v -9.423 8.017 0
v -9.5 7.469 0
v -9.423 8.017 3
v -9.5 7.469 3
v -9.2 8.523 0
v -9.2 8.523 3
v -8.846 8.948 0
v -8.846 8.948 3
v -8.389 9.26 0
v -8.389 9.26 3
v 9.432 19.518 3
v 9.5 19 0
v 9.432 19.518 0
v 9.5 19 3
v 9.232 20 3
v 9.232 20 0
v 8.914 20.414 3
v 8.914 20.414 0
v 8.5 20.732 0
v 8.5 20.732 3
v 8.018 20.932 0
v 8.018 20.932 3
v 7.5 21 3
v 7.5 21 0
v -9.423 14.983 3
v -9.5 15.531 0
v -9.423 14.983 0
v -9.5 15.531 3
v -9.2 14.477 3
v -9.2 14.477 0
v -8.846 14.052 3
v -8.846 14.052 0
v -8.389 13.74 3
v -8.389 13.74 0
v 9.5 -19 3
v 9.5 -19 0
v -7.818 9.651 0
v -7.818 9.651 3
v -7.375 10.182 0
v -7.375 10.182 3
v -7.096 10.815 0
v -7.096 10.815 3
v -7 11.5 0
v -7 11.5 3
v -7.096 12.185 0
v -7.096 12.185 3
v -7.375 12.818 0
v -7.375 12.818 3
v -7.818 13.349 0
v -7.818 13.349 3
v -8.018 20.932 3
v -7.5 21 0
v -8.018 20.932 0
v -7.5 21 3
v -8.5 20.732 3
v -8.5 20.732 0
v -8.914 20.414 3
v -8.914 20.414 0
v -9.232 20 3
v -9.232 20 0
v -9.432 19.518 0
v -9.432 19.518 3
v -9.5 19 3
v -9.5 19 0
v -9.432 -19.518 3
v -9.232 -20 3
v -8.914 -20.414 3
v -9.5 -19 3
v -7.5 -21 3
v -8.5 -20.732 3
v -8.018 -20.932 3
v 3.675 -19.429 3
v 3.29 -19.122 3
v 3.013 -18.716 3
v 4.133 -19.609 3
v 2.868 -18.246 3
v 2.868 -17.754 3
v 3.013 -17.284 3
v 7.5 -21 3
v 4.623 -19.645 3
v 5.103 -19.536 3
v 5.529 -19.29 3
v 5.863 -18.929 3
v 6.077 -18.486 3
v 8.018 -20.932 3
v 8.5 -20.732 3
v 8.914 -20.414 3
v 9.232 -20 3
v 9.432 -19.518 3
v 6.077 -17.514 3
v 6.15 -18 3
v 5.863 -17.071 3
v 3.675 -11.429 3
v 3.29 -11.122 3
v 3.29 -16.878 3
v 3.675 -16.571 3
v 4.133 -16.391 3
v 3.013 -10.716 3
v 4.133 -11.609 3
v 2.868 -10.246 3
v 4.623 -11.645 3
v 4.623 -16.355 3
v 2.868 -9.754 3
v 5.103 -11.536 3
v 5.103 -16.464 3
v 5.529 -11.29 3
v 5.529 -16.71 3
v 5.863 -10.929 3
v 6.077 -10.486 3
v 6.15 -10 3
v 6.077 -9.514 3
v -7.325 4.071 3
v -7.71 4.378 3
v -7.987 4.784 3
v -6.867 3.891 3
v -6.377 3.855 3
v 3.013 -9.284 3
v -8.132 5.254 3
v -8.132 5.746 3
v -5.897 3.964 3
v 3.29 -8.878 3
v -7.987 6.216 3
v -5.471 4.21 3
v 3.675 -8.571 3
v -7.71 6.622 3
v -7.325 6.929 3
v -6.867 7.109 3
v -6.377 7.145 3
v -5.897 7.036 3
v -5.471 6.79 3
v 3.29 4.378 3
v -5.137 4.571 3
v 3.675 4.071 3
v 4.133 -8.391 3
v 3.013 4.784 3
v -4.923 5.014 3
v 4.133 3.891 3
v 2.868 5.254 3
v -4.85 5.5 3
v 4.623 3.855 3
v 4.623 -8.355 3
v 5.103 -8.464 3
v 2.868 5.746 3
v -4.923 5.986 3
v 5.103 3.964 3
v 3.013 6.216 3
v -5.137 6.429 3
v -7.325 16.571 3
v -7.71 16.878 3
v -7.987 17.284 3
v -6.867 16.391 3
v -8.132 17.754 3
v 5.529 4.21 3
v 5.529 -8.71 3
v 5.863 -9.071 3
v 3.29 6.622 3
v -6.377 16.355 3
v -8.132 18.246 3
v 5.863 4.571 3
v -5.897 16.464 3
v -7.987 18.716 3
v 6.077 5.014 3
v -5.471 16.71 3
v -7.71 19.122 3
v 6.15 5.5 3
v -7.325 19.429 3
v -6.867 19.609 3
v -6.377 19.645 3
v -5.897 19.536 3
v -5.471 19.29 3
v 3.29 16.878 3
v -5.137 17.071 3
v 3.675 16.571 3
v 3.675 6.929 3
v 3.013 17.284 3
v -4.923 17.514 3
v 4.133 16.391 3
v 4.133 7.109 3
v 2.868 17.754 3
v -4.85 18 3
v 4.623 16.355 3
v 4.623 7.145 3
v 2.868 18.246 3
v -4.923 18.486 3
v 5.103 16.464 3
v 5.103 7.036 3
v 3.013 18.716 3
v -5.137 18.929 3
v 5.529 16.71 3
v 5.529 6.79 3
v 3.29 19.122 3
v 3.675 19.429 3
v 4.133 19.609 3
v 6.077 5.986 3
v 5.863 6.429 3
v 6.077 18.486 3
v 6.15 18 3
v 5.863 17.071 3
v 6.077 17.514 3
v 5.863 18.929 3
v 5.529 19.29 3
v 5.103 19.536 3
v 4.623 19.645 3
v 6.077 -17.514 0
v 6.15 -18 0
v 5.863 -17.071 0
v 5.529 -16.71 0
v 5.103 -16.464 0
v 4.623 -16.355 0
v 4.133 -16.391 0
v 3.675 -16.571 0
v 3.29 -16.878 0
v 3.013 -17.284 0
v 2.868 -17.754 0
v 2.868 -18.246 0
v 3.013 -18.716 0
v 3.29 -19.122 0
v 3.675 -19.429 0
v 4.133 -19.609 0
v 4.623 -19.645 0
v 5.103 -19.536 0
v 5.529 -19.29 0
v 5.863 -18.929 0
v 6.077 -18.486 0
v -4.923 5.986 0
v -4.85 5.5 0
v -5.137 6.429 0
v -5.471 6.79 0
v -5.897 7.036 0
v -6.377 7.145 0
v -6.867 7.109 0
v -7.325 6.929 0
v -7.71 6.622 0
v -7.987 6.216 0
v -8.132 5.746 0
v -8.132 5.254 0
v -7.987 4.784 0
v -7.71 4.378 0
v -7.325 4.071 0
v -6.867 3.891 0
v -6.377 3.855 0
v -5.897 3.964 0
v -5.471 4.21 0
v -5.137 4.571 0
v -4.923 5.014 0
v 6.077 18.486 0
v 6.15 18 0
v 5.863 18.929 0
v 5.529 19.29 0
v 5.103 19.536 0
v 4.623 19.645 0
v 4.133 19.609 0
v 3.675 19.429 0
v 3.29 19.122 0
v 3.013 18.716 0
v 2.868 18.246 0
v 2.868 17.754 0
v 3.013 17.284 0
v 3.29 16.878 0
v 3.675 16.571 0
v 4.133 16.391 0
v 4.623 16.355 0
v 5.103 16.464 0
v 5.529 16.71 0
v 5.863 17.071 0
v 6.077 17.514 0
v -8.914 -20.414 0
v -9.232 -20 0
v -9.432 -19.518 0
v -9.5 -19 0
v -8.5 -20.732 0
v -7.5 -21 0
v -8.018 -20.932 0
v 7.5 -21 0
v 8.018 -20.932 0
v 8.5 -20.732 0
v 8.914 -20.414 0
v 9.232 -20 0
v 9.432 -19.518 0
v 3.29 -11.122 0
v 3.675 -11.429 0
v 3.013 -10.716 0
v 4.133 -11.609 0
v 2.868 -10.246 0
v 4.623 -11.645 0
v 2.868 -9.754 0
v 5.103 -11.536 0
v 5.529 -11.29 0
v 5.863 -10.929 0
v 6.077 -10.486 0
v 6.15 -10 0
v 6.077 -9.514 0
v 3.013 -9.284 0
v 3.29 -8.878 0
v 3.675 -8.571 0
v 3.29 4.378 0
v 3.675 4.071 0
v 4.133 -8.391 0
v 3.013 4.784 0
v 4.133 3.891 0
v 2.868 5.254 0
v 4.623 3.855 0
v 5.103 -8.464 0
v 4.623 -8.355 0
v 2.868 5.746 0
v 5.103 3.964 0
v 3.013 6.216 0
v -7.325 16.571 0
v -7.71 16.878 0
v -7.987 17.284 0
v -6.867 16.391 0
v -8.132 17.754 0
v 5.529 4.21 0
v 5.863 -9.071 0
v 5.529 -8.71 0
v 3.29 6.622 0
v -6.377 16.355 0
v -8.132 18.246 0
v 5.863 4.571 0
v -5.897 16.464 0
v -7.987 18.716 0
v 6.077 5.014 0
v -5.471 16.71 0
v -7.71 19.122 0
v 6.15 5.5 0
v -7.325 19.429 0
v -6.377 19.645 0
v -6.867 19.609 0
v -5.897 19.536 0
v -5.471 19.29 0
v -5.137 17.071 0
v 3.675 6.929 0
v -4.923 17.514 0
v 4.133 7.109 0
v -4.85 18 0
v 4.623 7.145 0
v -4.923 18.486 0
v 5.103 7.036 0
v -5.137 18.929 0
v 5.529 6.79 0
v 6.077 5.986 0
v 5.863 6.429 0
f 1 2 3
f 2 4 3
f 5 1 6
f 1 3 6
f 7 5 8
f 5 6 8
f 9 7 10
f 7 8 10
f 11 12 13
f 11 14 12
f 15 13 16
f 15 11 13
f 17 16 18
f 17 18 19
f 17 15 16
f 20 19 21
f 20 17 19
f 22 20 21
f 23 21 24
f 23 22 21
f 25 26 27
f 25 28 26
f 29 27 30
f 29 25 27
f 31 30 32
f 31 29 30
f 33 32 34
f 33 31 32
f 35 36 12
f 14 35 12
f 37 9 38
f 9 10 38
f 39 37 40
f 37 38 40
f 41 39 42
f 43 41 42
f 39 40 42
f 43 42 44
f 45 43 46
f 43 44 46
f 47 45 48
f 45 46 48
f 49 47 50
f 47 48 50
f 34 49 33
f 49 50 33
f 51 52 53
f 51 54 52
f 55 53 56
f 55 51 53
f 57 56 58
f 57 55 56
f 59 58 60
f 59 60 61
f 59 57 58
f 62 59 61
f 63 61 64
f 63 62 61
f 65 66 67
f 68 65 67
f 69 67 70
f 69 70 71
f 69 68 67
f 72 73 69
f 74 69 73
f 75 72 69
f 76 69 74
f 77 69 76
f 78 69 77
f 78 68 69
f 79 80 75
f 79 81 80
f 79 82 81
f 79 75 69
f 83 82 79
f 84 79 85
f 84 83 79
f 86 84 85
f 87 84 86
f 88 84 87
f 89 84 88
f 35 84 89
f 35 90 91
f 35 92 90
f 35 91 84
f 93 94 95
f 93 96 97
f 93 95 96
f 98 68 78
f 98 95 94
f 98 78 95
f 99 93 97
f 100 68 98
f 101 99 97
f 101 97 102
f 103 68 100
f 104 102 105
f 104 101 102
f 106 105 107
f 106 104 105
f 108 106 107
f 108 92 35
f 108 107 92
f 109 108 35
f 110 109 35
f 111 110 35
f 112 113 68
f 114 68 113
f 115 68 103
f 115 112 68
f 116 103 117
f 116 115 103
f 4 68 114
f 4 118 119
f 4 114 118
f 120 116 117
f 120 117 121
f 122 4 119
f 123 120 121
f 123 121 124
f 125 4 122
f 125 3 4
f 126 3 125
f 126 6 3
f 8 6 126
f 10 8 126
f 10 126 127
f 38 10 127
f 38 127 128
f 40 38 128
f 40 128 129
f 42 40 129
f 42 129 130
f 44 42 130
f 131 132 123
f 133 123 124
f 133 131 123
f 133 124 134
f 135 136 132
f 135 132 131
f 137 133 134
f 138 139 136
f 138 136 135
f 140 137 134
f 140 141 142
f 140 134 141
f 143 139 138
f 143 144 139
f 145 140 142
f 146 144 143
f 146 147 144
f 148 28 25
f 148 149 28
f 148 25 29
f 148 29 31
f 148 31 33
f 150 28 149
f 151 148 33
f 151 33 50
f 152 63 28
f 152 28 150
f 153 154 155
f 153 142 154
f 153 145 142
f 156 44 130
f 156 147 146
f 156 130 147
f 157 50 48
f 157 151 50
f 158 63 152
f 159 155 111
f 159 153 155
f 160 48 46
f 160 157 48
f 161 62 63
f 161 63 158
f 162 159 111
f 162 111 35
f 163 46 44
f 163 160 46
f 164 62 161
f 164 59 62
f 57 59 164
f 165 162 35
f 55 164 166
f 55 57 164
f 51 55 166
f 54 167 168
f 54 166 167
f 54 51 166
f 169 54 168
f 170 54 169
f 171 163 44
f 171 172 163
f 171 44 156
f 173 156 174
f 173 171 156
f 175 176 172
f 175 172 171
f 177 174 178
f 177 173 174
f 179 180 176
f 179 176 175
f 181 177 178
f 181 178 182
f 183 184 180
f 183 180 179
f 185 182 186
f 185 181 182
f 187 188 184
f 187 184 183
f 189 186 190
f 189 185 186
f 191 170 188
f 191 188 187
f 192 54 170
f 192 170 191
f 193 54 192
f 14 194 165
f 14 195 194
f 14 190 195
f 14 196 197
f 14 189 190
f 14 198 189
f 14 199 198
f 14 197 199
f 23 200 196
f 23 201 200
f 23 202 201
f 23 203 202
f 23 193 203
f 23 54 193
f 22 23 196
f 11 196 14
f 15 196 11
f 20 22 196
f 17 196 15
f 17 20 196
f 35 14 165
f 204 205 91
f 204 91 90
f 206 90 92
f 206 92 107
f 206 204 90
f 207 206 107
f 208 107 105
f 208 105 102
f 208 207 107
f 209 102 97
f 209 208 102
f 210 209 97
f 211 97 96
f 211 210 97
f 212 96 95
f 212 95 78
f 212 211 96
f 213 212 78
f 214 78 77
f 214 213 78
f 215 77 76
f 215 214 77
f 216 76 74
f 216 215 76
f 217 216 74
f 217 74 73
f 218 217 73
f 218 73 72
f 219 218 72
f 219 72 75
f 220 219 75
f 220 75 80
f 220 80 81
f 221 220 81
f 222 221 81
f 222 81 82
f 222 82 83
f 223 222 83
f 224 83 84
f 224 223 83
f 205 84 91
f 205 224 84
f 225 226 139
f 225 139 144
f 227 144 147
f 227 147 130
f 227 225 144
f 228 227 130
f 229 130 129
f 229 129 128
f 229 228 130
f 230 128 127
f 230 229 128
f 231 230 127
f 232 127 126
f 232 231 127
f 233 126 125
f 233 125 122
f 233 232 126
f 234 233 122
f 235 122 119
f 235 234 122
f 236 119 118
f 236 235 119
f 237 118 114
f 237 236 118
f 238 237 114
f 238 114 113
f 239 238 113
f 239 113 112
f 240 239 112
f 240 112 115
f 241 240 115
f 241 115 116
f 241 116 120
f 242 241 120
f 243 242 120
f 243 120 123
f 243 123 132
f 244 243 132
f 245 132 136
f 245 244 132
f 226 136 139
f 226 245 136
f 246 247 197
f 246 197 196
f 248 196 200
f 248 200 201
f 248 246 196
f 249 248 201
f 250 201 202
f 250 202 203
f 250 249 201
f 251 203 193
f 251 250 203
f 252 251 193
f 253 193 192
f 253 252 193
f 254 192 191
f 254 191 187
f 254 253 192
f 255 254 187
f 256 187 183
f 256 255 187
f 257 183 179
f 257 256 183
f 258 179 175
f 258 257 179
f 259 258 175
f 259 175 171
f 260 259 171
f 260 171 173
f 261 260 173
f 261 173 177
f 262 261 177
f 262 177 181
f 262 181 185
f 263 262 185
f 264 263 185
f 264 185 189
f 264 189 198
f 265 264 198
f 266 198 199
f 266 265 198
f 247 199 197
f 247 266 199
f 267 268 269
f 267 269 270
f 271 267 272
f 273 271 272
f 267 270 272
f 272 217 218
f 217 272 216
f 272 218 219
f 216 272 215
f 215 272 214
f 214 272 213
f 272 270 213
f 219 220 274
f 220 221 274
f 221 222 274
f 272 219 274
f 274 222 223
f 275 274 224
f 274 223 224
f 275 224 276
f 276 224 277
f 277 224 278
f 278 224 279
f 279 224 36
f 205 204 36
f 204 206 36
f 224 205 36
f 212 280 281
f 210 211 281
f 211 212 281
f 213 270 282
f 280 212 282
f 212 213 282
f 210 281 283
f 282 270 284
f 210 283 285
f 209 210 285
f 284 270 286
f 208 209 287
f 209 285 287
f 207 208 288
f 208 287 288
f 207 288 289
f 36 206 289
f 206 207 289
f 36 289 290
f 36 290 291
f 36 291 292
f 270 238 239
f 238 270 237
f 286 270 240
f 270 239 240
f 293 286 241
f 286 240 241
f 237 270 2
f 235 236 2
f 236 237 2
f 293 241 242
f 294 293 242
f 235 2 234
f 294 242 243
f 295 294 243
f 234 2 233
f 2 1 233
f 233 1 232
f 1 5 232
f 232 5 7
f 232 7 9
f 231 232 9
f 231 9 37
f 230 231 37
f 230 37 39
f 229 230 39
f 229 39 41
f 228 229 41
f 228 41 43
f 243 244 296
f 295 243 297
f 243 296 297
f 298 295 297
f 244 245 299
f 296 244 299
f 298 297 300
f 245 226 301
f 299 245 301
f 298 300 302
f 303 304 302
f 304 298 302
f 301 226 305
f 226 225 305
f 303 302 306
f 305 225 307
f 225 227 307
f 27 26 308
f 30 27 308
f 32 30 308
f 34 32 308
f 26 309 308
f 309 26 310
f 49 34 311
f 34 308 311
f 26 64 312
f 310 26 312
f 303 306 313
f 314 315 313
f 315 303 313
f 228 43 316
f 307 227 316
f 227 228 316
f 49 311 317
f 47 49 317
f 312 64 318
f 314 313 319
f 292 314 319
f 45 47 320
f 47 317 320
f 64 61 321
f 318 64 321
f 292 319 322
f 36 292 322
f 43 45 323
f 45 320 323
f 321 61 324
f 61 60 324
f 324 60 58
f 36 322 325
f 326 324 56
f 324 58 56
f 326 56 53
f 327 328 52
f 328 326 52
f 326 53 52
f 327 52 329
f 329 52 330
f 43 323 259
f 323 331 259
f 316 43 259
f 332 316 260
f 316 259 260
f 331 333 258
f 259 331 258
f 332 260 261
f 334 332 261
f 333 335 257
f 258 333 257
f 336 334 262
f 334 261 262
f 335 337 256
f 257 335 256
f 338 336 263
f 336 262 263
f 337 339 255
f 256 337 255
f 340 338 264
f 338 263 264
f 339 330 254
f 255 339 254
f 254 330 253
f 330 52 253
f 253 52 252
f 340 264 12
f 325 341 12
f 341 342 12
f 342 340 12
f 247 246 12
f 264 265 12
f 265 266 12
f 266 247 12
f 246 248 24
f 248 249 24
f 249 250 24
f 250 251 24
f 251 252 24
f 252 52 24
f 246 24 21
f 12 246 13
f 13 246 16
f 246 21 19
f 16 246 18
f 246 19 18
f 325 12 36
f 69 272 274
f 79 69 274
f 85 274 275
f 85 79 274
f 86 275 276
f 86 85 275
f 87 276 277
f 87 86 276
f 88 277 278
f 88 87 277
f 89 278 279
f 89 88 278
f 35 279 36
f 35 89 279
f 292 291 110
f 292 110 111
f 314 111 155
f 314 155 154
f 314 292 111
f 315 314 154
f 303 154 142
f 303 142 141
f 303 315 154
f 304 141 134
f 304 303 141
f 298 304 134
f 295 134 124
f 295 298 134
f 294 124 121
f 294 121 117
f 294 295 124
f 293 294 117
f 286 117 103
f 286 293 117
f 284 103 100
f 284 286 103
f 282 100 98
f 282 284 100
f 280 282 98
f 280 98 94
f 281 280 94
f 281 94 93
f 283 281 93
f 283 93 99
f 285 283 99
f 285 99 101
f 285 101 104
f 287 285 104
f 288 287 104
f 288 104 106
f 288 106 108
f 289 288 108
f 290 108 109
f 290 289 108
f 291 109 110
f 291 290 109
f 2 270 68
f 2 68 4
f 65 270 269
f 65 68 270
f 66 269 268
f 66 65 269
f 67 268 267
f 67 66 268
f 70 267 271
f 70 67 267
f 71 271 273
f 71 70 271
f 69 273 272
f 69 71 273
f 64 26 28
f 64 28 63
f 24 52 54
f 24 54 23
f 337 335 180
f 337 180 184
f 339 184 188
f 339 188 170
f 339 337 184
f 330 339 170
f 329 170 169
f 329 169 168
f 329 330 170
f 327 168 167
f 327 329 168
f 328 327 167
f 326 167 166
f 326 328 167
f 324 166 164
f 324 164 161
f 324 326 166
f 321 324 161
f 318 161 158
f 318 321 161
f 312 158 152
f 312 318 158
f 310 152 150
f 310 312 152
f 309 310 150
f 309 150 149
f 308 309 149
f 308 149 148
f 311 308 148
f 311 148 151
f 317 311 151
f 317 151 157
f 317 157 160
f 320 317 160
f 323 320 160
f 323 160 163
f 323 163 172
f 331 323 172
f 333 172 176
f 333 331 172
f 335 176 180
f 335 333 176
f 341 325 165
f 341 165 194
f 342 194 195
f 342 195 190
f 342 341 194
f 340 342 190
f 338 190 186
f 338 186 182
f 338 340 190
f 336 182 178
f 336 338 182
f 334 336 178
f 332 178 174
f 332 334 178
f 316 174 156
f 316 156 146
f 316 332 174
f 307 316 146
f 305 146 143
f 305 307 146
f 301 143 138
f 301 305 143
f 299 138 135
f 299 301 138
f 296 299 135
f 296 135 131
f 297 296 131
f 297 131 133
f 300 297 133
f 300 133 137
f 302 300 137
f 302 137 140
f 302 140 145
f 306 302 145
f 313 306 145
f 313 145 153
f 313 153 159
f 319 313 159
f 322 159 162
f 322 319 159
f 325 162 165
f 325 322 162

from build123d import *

# Parameters (mm, degrees)
SKETCH_1_W          = 19
SKETCH_1_H          = 42
SKETCH_1_R          = 1.65
EXTRUDE_1_DEPTH     = 3
SKETCH_2_R          = 2.5
CUT_EXTRUDE_1_DEPTH = 4
FILLET_1_R          = 2
FILLET_2_R          = 2


with BuildPart() as part:
    # 草图1 → 凸台-拉伸1 (new body)
    with BuildSketch(Plane.XY):
        Rectangle(SKETCH_1_W, SKETCH_1_H)
        with Locations((-6.5, 18)):
            Circle(SKETCH_1_R, mode=Mode.SUBTRACT)
        with Locations((-6.5, 5.5)):
            Circle(SKETCH_1_R, mode=Mode.SUBTRACT)
        with Locations((4.5, -10)):
            Circle(SKETCH_1_R, mode=Mode.SUBTRACT)
        with Locations((4.5, -18)):
            Circle(SKETCH_1_R, mode=Mode.SUBTRACT)
        with Locations((4.5, 18)):
            Circle(SKETCH_1_R, mode=Mode.SUBTRACT)
        with Locations((4.5, 5.5)):
            Circle(SKETCH_1_R, mode=Mode.SUBTRACT)
    extrude(amount=EXTRUDE_1_DEPTH)

    # 草图2 → 切除-拉伸1 (cut, through all)
    with BuildSketch(Plane.XY.offset(3)):
        with Locations((-9.5, 11.5)):
            Circle(SKETCH_2_R)
    extrude(amount=-CUT_EXTRUDE_1_DEPTH, mode=Mode.SUBTRACT)

    # 圆角1
    fillet_1_edges = [part.edges().sort_by_distance(p)[0] for p in [
        (-9.5, 9, 1.5),
        (-9.5, 14, 1.5),
    ]]
    fillet(fillet_1_edges, radius=FILLET_1_R)

    # 圆角2
    fillet_2_edges = [part.edges().sort_by_distance(p)[0] for p in [
        (9.5, -21, 1.5),
        (-9.5, -21, 1.5),
        (-9.5, 21, 1.5),
        (9.5, 21, 1.5),
    ]]
    fillet(fillet_2_edges, radius=FILLET_2_R)


solid = part.part
